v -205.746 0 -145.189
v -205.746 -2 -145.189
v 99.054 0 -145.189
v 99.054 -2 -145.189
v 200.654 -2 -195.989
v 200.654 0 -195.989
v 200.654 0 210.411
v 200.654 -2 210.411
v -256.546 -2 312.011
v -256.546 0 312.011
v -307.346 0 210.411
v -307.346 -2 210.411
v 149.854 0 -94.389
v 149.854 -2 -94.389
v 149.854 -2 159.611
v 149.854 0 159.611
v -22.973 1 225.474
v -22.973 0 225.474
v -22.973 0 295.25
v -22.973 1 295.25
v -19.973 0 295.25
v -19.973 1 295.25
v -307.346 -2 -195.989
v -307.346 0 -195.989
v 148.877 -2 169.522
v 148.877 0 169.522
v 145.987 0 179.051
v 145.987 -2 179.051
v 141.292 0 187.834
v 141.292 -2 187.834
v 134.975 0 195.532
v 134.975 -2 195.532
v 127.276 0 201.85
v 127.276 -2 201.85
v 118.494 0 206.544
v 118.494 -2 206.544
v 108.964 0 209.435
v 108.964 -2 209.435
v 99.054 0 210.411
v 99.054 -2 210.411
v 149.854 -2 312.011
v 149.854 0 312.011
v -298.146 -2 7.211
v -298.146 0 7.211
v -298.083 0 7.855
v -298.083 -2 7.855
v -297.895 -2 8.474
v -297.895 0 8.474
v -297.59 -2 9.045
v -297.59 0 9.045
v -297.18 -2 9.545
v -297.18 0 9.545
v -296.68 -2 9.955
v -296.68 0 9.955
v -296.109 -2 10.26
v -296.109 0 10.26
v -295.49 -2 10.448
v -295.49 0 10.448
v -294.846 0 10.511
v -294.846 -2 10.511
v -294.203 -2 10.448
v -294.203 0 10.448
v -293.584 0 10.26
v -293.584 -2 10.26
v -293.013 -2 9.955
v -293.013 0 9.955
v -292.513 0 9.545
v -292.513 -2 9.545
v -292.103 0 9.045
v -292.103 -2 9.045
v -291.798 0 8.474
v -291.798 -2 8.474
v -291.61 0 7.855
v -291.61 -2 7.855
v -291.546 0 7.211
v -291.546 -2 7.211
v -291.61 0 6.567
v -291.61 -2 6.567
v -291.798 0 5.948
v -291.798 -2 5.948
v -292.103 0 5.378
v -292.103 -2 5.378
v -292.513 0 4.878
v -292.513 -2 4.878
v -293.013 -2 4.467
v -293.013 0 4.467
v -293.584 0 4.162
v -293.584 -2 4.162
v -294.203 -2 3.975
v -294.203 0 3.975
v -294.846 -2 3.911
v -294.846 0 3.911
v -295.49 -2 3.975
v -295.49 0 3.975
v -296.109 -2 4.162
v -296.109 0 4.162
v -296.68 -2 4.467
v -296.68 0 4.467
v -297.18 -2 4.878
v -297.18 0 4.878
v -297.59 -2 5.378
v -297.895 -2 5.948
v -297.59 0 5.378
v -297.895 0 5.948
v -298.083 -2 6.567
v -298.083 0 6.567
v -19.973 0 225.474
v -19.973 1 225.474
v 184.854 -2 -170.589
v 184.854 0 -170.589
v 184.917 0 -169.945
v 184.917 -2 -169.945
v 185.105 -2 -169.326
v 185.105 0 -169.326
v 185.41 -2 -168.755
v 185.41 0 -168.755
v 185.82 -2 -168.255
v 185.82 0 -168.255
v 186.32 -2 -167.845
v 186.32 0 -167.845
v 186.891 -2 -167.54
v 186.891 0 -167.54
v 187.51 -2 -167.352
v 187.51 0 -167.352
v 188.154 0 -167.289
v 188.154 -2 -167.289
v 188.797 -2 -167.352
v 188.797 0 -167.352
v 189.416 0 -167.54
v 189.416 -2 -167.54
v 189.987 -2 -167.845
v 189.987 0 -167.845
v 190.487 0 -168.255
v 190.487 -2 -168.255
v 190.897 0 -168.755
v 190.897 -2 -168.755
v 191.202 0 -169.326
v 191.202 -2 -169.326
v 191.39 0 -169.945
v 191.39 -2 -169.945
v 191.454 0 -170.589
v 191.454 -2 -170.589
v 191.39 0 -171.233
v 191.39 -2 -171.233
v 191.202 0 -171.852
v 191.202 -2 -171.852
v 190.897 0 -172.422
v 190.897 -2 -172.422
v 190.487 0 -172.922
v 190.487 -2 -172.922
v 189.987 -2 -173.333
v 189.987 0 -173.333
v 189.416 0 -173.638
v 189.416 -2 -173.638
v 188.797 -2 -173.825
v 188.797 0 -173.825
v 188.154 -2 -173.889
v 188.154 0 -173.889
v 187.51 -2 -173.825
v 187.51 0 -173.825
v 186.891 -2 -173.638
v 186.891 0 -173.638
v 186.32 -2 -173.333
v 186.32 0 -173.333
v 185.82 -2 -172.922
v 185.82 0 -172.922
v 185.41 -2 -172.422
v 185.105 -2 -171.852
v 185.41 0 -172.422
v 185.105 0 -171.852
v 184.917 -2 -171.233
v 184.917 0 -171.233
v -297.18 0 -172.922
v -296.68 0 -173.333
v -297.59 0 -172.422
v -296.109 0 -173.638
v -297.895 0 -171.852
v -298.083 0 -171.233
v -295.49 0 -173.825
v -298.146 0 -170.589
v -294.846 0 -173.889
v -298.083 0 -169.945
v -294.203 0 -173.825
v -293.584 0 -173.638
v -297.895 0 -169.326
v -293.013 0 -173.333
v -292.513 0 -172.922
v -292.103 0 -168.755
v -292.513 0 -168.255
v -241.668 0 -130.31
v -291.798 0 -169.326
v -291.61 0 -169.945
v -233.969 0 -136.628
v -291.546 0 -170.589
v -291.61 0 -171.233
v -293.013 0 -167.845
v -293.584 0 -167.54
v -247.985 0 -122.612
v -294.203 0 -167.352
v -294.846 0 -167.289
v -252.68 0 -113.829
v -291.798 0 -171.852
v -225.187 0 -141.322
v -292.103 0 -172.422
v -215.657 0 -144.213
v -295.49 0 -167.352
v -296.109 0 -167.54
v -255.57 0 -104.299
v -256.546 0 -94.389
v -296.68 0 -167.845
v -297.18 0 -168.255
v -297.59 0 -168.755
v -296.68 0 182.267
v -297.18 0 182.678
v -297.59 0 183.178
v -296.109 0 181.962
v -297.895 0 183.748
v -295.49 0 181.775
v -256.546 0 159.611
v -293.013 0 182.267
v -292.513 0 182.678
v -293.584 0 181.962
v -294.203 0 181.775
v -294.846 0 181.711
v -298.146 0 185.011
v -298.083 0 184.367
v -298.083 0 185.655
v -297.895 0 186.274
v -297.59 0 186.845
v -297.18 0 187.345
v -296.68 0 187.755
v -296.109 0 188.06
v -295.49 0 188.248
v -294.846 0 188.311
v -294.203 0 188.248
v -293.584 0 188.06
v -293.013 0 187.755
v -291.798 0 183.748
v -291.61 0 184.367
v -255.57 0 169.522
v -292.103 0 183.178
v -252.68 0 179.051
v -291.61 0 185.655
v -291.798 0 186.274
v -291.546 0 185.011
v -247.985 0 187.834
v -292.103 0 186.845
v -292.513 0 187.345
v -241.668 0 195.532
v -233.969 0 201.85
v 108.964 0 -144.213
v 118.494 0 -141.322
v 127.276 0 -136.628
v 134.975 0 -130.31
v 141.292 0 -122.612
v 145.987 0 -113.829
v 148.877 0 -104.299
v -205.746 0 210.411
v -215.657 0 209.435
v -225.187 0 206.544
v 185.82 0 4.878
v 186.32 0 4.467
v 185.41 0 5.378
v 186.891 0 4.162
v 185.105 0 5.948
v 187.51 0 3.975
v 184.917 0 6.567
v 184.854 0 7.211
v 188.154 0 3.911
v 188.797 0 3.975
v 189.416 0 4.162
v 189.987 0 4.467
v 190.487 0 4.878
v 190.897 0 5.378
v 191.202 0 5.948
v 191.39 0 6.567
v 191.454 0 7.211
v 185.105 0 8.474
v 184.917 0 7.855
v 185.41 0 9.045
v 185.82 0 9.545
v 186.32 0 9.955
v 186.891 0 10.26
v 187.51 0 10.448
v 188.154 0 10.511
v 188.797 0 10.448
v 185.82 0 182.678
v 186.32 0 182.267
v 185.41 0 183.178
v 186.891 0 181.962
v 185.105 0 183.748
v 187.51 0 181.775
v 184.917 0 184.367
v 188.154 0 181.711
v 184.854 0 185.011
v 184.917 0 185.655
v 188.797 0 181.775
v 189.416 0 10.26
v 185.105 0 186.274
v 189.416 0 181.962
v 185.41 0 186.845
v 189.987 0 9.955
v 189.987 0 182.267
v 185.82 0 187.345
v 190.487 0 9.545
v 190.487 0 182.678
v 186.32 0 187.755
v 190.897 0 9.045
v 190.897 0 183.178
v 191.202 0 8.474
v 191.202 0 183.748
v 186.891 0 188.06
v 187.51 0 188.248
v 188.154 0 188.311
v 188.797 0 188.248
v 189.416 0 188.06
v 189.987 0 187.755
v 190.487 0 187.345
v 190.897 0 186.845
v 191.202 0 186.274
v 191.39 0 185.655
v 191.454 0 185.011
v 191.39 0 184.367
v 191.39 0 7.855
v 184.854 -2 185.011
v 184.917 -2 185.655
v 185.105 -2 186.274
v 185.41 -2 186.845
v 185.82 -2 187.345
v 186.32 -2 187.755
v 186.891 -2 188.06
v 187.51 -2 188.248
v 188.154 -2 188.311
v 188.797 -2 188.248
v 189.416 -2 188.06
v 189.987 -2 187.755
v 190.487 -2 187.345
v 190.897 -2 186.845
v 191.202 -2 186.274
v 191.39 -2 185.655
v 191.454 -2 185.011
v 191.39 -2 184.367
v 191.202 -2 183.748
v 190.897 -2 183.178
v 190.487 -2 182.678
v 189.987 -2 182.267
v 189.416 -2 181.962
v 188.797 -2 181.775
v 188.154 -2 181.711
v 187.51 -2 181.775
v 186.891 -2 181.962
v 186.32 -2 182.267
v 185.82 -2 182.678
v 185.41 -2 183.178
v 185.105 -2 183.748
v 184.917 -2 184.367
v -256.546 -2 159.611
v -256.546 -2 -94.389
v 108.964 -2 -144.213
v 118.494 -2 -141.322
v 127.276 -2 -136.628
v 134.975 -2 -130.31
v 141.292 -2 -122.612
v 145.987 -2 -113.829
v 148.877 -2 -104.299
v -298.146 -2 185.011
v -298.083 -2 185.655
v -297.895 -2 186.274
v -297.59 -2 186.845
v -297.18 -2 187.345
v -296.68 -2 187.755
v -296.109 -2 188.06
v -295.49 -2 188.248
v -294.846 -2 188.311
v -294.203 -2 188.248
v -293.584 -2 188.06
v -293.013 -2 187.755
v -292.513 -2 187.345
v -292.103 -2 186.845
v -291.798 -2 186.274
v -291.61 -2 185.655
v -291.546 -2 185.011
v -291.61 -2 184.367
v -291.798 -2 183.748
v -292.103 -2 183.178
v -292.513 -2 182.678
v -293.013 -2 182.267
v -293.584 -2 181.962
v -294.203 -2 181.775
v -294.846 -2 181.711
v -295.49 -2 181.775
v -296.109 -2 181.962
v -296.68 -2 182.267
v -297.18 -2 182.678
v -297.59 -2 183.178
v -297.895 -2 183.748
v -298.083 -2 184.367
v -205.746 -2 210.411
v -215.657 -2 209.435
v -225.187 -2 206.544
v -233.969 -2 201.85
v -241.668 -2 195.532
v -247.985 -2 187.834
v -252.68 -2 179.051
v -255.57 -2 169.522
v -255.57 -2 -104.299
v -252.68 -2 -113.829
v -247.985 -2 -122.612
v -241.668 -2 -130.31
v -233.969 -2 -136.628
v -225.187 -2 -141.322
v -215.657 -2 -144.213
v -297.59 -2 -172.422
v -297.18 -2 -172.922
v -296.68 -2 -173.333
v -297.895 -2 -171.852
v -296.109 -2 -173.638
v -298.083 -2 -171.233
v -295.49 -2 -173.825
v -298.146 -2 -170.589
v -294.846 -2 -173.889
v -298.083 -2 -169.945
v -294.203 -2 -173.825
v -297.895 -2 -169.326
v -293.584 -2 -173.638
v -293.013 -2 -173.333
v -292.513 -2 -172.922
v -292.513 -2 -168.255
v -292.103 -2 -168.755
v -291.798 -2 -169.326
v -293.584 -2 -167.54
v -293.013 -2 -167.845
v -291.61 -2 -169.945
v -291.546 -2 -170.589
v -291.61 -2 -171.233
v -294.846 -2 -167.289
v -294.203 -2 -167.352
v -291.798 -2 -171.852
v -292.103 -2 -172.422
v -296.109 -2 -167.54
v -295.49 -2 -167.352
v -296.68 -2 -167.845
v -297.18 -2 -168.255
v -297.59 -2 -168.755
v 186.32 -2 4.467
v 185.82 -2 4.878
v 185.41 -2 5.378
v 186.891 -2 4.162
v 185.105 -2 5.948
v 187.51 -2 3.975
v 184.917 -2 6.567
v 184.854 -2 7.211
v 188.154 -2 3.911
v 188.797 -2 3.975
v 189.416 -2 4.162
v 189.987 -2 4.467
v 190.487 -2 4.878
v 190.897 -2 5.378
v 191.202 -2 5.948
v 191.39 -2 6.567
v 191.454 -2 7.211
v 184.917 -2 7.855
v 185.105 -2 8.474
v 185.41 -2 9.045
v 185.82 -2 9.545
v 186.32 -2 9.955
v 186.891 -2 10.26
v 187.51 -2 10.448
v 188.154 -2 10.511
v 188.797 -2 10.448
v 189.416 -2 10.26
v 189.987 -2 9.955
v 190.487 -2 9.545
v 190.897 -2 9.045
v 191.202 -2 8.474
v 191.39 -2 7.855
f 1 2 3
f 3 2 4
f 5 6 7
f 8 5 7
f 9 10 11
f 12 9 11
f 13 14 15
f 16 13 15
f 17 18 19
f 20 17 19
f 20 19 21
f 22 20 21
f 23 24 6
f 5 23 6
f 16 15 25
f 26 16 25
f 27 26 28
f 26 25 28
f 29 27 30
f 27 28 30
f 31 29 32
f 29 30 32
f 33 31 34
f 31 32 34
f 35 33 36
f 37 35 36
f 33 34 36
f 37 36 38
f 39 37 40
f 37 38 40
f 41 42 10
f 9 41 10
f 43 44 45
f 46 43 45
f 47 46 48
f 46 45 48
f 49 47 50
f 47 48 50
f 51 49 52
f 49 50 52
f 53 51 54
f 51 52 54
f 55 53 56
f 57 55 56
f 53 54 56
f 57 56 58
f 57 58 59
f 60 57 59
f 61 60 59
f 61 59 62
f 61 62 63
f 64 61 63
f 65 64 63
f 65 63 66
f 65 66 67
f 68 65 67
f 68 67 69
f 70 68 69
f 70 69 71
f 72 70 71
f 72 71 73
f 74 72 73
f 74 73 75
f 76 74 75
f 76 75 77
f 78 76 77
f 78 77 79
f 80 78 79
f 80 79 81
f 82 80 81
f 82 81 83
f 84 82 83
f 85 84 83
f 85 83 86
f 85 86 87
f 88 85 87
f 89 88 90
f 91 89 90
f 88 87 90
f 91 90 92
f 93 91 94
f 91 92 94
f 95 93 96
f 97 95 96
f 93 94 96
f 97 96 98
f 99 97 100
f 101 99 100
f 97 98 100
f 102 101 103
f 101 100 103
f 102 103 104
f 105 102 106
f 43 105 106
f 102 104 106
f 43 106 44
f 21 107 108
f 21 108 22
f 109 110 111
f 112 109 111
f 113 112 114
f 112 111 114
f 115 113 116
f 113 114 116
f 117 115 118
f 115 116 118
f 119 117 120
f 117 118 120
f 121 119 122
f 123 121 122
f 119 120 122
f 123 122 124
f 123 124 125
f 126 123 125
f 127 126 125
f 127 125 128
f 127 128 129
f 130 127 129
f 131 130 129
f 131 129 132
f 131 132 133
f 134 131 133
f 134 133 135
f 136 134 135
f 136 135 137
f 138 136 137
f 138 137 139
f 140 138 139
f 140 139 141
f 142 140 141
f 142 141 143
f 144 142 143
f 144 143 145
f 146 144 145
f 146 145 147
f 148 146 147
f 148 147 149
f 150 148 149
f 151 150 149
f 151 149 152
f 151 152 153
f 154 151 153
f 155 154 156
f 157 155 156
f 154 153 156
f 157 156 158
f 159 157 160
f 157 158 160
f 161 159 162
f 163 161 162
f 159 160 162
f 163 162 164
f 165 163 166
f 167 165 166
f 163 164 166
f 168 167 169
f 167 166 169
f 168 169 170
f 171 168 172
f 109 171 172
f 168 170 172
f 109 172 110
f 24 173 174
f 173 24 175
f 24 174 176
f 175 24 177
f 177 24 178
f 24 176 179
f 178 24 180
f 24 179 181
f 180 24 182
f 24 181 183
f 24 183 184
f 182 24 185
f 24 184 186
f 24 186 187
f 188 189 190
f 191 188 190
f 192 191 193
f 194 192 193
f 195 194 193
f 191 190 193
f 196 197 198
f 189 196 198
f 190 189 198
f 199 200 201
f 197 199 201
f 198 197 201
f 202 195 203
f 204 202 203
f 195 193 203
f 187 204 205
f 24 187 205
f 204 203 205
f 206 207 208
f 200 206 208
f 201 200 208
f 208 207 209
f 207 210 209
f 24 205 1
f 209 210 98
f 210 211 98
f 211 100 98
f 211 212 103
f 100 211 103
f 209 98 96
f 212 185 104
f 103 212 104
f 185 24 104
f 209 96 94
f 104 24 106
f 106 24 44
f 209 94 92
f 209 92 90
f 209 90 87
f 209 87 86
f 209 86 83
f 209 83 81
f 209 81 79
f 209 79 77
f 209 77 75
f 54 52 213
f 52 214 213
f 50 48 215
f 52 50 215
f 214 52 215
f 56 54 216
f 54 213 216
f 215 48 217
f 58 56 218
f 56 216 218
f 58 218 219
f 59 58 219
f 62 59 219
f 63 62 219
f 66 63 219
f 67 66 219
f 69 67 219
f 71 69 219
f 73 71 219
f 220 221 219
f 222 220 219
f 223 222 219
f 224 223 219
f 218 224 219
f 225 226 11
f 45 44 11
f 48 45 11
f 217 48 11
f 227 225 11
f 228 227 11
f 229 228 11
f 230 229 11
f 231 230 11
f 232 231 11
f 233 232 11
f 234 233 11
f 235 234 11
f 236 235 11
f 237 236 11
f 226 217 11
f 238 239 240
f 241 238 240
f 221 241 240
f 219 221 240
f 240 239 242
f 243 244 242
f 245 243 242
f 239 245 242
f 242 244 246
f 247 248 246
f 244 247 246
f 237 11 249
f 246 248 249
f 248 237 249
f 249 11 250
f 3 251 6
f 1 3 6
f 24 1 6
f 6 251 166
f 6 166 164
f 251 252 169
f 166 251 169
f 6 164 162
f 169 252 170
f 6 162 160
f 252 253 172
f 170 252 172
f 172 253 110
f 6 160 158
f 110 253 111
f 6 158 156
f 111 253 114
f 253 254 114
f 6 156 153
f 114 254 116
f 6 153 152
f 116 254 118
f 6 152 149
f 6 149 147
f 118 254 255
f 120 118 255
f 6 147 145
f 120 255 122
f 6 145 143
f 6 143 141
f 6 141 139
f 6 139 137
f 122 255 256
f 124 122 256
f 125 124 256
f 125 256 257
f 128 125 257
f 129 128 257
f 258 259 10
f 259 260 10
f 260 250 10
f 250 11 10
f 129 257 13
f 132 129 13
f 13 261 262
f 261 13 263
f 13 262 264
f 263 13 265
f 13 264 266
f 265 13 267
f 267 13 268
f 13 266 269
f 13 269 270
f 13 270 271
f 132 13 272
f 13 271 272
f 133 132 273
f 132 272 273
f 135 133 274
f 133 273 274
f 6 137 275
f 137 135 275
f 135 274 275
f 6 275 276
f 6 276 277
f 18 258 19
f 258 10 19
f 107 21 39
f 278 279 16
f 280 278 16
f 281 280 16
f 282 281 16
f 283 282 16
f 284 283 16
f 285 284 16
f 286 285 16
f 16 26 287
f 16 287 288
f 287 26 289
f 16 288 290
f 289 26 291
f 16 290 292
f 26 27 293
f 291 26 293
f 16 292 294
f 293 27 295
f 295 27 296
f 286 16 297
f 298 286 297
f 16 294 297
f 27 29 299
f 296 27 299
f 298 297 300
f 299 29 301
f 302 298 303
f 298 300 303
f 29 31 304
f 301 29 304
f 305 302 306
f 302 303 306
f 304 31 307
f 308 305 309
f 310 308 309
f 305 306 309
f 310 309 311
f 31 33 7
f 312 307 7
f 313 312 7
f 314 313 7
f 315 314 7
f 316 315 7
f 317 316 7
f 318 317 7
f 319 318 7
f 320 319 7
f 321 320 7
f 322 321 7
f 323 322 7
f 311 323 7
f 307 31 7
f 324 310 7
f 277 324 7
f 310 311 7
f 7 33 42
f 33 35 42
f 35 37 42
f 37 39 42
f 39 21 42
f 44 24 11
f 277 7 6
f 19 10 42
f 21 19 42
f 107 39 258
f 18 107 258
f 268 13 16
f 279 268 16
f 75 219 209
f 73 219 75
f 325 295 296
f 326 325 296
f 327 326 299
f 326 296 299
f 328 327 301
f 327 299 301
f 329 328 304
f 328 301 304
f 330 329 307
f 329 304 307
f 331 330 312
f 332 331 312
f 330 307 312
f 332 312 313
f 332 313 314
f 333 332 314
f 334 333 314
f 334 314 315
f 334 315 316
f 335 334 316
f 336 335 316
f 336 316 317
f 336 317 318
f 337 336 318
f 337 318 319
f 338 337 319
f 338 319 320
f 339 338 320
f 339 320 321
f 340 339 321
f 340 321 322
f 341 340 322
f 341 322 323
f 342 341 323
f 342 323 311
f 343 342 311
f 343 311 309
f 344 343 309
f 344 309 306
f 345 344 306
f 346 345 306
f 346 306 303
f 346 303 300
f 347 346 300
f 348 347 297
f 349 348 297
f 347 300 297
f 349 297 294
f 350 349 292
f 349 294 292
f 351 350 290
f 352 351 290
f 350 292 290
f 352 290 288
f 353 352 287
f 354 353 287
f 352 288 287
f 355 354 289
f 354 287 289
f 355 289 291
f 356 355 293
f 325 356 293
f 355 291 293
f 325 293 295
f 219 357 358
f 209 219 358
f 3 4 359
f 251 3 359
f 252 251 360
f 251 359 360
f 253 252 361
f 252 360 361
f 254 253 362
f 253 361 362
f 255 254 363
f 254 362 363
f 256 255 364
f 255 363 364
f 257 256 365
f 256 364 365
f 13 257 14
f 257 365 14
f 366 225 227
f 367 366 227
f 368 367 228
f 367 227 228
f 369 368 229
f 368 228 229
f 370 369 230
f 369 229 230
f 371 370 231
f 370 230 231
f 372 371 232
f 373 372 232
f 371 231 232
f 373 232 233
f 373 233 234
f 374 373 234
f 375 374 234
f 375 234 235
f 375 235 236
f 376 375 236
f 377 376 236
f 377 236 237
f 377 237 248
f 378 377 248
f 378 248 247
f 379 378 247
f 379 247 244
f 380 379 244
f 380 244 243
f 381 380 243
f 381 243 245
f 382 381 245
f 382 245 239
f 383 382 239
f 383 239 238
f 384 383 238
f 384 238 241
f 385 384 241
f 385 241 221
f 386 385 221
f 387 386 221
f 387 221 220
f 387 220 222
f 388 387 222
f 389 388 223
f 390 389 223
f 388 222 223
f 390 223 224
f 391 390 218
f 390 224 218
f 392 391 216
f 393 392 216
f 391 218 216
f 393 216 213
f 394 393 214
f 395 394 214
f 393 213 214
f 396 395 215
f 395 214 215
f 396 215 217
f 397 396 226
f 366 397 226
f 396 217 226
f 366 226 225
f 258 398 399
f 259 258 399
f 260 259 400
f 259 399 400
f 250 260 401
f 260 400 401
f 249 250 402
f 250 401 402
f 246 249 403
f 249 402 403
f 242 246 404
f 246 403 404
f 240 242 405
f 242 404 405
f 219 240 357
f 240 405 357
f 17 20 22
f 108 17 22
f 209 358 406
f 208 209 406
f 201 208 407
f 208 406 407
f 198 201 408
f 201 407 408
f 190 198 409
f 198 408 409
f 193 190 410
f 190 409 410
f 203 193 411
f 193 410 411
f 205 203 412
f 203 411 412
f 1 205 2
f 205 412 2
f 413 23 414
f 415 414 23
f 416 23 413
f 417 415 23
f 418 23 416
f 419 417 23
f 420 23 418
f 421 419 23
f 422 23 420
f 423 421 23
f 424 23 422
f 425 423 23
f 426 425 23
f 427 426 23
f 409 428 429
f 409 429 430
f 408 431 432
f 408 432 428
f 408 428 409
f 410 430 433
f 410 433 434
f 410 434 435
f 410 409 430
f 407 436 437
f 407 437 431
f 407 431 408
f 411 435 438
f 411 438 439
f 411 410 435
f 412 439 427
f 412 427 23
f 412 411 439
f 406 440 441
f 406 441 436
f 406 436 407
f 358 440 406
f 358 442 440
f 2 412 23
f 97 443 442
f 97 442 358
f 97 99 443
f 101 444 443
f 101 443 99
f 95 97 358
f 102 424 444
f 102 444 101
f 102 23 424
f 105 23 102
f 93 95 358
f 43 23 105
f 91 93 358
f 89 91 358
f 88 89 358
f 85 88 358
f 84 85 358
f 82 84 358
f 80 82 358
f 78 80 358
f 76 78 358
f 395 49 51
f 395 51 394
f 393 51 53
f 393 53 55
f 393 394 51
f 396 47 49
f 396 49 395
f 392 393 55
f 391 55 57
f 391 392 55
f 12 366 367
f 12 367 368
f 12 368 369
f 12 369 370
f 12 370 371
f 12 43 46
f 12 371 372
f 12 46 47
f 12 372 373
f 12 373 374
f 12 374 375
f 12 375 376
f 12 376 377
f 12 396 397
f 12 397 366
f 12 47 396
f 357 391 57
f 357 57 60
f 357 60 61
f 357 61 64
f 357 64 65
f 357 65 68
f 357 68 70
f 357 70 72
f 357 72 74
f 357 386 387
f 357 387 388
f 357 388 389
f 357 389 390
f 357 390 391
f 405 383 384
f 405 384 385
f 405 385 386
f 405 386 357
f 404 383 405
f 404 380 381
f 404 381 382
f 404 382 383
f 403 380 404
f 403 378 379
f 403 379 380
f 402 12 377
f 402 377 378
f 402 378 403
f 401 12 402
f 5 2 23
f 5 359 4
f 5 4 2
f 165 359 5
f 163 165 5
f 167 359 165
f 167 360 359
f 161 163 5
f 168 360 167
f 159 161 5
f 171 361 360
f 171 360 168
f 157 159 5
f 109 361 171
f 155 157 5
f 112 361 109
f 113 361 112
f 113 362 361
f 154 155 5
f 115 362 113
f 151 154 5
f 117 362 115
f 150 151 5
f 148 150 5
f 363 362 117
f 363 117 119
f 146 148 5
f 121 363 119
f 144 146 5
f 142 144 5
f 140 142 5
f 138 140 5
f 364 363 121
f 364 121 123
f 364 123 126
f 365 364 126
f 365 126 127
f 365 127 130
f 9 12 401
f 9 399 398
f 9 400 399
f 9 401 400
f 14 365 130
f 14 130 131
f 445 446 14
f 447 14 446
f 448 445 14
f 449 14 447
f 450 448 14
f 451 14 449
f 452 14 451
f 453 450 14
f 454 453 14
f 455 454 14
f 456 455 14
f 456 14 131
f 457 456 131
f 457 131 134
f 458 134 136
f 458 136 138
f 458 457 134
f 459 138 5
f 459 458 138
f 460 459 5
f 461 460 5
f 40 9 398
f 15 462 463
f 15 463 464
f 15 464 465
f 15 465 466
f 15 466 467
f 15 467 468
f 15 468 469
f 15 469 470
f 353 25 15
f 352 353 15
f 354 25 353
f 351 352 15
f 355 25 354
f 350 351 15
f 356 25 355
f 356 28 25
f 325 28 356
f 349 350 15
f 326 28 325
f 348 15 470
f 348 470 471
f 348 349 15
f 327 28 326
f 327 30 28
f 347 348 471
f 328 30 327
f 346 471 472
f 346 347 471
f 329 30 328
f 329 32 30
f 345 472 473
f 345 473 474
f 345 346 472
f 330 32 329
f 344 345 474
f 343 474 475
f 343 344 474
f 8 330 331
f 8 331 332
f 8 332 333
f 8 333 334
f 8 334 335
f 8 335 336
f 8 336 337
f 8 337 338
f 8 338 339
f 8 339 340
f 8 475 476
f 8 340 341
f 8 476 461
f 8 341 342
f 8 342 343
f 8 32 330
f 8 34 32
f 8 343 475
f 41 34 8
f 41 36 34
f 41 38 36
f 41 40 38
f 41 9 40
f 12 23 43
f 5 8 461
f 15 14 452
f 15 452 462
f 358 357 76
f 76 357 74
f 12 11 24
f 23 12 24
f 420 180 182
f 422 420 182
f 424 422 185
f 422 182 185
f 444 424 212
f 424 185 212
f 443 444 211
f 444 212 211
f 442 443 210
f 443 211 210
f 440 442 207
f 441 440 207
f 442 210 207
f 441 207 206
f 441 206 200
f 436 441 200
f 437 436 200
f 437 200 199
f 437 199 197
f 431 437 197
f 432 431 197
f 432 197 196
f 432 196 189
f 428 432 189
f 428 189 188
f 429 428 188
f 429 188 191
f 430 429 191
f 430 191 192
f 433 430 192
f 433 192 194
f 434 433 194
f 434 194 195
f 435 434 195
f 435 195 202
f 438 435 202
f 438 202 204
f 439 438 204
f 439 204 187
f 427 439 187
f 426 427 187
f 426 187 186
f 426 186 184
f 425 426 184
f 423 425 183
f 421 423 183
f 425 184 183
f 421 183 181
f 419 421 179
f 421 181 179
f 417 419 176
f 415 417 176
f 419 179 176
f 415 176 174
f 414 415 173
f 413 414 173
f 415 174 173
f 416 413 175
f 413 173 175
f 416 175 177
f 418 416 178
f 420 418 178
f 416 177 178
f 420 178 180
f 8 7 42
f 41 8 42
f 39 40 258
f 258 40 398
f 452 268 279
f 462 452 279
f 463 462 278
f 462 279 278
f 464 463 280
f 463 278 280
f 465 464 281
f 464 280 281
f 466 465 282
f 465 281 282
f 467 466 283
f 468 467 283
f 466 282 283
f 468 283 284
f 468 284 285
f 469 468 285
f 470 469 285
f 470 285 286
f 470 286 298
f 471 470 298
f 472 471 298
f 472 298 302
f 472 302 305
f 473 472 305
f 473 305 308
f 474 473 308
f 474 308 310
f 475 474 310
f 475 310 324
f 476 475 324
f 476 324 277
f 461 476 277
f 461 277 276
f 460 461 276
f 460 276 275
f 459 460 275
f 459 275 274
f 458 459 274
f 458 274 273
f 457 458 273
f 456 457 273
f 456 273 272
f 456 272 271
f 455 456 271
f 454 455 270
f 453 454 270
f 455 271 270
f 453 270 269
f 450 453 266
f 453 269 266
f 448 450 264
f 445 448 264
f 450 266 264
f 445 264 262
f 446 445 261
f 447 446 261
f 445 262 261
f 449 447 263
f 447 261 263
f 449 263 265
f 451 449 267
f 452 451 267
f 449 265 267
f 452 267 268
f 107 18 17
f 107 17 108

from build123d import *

# Parameters (mm, degrees)
F1_DEPTH = 2
F3_DEPTH = 2.001
F4_W     = 3
F4_H     = 69.7761774063
F5_DEPTH = 3
F7_D     = 6.6


with BuildPart() as f1:
    # F0 (on Front) → F1 (new body)
    with BuildSketch(Plane.XZ):
        Polygon((-307.3464844827, 210.4111198679), (-307.3464844827, -195.9888801321), (200.6535155173, -195.9888801321), (200.6535155173, 210.4111198679), (149.8535155173, 312.0111198679), (-256.5464844827, 312.0111198679), align=None)
    extrude(amount=F1_DEPTH)

    # F2 (on face) → F3 (cut, through all)
    with BuildSketch(Plane.XZ.offset(2)):
        with BuildLine():
            Line((99.0535155173, 210.4111198679), (-205.7464844827, 210.4111198679))
            ThreePointArc((-205.7464844827, 210.4111198679), (-241.667508967, 195.5321443521), (-256.5464844827, 159.6111198679))
            Line((-256.5464844827, 159.6111198679), (-256.5464844827, -94.3888801321))
            ThreePointArc((-256.5464844827, -94.3888801321), (-241.667508967, -130.3099046164), (-205.7464844827, -145.1888801321))
            Line((-205.7464844827, -145.1888801321), (99.0535155173, -145.1888801321))
            ThreePointArc((99.0535155173, -145.1888801321), (134.9745400016, -130.3099046164), (149.8535155173, -94.3888801321))
            Line((149.8535155173, -94.3888801321), (149.8535155173, 159.6111198679))
            ThreePointArc((149.8535155173, 159.6111198679), (134.9745400016, 195.5321443521), (99.0535155173, 210.4111198679))
        make_face()
    extrude(amount=-F3_DEPTH, mode=Mode.SUBTRACT)

    # F4 (on face) → F5 (join)
    with BuildSketch(Plane.XZ.offset(2)):
        with Locations((-21.4731446389, 260.3619992733)):
            Rectangle(F4_W, F4_H)
    extrude(amount=-F5_DEPTH)

    # F7 (through all)
    with Locations(Plane.XZ.offset(2)):
        with Locations((-294.8464844827, 185.0111198679), (-294.8464844827, 7.2111198679), (-294.8464844827, -170.5888801321), (188.1535155173, -170.5888801321), (188.1535155173, 7.2111198679), (188.1535155173, 185.0111198679)):
            Hole(F7_D / 2)


solid = f1.part
